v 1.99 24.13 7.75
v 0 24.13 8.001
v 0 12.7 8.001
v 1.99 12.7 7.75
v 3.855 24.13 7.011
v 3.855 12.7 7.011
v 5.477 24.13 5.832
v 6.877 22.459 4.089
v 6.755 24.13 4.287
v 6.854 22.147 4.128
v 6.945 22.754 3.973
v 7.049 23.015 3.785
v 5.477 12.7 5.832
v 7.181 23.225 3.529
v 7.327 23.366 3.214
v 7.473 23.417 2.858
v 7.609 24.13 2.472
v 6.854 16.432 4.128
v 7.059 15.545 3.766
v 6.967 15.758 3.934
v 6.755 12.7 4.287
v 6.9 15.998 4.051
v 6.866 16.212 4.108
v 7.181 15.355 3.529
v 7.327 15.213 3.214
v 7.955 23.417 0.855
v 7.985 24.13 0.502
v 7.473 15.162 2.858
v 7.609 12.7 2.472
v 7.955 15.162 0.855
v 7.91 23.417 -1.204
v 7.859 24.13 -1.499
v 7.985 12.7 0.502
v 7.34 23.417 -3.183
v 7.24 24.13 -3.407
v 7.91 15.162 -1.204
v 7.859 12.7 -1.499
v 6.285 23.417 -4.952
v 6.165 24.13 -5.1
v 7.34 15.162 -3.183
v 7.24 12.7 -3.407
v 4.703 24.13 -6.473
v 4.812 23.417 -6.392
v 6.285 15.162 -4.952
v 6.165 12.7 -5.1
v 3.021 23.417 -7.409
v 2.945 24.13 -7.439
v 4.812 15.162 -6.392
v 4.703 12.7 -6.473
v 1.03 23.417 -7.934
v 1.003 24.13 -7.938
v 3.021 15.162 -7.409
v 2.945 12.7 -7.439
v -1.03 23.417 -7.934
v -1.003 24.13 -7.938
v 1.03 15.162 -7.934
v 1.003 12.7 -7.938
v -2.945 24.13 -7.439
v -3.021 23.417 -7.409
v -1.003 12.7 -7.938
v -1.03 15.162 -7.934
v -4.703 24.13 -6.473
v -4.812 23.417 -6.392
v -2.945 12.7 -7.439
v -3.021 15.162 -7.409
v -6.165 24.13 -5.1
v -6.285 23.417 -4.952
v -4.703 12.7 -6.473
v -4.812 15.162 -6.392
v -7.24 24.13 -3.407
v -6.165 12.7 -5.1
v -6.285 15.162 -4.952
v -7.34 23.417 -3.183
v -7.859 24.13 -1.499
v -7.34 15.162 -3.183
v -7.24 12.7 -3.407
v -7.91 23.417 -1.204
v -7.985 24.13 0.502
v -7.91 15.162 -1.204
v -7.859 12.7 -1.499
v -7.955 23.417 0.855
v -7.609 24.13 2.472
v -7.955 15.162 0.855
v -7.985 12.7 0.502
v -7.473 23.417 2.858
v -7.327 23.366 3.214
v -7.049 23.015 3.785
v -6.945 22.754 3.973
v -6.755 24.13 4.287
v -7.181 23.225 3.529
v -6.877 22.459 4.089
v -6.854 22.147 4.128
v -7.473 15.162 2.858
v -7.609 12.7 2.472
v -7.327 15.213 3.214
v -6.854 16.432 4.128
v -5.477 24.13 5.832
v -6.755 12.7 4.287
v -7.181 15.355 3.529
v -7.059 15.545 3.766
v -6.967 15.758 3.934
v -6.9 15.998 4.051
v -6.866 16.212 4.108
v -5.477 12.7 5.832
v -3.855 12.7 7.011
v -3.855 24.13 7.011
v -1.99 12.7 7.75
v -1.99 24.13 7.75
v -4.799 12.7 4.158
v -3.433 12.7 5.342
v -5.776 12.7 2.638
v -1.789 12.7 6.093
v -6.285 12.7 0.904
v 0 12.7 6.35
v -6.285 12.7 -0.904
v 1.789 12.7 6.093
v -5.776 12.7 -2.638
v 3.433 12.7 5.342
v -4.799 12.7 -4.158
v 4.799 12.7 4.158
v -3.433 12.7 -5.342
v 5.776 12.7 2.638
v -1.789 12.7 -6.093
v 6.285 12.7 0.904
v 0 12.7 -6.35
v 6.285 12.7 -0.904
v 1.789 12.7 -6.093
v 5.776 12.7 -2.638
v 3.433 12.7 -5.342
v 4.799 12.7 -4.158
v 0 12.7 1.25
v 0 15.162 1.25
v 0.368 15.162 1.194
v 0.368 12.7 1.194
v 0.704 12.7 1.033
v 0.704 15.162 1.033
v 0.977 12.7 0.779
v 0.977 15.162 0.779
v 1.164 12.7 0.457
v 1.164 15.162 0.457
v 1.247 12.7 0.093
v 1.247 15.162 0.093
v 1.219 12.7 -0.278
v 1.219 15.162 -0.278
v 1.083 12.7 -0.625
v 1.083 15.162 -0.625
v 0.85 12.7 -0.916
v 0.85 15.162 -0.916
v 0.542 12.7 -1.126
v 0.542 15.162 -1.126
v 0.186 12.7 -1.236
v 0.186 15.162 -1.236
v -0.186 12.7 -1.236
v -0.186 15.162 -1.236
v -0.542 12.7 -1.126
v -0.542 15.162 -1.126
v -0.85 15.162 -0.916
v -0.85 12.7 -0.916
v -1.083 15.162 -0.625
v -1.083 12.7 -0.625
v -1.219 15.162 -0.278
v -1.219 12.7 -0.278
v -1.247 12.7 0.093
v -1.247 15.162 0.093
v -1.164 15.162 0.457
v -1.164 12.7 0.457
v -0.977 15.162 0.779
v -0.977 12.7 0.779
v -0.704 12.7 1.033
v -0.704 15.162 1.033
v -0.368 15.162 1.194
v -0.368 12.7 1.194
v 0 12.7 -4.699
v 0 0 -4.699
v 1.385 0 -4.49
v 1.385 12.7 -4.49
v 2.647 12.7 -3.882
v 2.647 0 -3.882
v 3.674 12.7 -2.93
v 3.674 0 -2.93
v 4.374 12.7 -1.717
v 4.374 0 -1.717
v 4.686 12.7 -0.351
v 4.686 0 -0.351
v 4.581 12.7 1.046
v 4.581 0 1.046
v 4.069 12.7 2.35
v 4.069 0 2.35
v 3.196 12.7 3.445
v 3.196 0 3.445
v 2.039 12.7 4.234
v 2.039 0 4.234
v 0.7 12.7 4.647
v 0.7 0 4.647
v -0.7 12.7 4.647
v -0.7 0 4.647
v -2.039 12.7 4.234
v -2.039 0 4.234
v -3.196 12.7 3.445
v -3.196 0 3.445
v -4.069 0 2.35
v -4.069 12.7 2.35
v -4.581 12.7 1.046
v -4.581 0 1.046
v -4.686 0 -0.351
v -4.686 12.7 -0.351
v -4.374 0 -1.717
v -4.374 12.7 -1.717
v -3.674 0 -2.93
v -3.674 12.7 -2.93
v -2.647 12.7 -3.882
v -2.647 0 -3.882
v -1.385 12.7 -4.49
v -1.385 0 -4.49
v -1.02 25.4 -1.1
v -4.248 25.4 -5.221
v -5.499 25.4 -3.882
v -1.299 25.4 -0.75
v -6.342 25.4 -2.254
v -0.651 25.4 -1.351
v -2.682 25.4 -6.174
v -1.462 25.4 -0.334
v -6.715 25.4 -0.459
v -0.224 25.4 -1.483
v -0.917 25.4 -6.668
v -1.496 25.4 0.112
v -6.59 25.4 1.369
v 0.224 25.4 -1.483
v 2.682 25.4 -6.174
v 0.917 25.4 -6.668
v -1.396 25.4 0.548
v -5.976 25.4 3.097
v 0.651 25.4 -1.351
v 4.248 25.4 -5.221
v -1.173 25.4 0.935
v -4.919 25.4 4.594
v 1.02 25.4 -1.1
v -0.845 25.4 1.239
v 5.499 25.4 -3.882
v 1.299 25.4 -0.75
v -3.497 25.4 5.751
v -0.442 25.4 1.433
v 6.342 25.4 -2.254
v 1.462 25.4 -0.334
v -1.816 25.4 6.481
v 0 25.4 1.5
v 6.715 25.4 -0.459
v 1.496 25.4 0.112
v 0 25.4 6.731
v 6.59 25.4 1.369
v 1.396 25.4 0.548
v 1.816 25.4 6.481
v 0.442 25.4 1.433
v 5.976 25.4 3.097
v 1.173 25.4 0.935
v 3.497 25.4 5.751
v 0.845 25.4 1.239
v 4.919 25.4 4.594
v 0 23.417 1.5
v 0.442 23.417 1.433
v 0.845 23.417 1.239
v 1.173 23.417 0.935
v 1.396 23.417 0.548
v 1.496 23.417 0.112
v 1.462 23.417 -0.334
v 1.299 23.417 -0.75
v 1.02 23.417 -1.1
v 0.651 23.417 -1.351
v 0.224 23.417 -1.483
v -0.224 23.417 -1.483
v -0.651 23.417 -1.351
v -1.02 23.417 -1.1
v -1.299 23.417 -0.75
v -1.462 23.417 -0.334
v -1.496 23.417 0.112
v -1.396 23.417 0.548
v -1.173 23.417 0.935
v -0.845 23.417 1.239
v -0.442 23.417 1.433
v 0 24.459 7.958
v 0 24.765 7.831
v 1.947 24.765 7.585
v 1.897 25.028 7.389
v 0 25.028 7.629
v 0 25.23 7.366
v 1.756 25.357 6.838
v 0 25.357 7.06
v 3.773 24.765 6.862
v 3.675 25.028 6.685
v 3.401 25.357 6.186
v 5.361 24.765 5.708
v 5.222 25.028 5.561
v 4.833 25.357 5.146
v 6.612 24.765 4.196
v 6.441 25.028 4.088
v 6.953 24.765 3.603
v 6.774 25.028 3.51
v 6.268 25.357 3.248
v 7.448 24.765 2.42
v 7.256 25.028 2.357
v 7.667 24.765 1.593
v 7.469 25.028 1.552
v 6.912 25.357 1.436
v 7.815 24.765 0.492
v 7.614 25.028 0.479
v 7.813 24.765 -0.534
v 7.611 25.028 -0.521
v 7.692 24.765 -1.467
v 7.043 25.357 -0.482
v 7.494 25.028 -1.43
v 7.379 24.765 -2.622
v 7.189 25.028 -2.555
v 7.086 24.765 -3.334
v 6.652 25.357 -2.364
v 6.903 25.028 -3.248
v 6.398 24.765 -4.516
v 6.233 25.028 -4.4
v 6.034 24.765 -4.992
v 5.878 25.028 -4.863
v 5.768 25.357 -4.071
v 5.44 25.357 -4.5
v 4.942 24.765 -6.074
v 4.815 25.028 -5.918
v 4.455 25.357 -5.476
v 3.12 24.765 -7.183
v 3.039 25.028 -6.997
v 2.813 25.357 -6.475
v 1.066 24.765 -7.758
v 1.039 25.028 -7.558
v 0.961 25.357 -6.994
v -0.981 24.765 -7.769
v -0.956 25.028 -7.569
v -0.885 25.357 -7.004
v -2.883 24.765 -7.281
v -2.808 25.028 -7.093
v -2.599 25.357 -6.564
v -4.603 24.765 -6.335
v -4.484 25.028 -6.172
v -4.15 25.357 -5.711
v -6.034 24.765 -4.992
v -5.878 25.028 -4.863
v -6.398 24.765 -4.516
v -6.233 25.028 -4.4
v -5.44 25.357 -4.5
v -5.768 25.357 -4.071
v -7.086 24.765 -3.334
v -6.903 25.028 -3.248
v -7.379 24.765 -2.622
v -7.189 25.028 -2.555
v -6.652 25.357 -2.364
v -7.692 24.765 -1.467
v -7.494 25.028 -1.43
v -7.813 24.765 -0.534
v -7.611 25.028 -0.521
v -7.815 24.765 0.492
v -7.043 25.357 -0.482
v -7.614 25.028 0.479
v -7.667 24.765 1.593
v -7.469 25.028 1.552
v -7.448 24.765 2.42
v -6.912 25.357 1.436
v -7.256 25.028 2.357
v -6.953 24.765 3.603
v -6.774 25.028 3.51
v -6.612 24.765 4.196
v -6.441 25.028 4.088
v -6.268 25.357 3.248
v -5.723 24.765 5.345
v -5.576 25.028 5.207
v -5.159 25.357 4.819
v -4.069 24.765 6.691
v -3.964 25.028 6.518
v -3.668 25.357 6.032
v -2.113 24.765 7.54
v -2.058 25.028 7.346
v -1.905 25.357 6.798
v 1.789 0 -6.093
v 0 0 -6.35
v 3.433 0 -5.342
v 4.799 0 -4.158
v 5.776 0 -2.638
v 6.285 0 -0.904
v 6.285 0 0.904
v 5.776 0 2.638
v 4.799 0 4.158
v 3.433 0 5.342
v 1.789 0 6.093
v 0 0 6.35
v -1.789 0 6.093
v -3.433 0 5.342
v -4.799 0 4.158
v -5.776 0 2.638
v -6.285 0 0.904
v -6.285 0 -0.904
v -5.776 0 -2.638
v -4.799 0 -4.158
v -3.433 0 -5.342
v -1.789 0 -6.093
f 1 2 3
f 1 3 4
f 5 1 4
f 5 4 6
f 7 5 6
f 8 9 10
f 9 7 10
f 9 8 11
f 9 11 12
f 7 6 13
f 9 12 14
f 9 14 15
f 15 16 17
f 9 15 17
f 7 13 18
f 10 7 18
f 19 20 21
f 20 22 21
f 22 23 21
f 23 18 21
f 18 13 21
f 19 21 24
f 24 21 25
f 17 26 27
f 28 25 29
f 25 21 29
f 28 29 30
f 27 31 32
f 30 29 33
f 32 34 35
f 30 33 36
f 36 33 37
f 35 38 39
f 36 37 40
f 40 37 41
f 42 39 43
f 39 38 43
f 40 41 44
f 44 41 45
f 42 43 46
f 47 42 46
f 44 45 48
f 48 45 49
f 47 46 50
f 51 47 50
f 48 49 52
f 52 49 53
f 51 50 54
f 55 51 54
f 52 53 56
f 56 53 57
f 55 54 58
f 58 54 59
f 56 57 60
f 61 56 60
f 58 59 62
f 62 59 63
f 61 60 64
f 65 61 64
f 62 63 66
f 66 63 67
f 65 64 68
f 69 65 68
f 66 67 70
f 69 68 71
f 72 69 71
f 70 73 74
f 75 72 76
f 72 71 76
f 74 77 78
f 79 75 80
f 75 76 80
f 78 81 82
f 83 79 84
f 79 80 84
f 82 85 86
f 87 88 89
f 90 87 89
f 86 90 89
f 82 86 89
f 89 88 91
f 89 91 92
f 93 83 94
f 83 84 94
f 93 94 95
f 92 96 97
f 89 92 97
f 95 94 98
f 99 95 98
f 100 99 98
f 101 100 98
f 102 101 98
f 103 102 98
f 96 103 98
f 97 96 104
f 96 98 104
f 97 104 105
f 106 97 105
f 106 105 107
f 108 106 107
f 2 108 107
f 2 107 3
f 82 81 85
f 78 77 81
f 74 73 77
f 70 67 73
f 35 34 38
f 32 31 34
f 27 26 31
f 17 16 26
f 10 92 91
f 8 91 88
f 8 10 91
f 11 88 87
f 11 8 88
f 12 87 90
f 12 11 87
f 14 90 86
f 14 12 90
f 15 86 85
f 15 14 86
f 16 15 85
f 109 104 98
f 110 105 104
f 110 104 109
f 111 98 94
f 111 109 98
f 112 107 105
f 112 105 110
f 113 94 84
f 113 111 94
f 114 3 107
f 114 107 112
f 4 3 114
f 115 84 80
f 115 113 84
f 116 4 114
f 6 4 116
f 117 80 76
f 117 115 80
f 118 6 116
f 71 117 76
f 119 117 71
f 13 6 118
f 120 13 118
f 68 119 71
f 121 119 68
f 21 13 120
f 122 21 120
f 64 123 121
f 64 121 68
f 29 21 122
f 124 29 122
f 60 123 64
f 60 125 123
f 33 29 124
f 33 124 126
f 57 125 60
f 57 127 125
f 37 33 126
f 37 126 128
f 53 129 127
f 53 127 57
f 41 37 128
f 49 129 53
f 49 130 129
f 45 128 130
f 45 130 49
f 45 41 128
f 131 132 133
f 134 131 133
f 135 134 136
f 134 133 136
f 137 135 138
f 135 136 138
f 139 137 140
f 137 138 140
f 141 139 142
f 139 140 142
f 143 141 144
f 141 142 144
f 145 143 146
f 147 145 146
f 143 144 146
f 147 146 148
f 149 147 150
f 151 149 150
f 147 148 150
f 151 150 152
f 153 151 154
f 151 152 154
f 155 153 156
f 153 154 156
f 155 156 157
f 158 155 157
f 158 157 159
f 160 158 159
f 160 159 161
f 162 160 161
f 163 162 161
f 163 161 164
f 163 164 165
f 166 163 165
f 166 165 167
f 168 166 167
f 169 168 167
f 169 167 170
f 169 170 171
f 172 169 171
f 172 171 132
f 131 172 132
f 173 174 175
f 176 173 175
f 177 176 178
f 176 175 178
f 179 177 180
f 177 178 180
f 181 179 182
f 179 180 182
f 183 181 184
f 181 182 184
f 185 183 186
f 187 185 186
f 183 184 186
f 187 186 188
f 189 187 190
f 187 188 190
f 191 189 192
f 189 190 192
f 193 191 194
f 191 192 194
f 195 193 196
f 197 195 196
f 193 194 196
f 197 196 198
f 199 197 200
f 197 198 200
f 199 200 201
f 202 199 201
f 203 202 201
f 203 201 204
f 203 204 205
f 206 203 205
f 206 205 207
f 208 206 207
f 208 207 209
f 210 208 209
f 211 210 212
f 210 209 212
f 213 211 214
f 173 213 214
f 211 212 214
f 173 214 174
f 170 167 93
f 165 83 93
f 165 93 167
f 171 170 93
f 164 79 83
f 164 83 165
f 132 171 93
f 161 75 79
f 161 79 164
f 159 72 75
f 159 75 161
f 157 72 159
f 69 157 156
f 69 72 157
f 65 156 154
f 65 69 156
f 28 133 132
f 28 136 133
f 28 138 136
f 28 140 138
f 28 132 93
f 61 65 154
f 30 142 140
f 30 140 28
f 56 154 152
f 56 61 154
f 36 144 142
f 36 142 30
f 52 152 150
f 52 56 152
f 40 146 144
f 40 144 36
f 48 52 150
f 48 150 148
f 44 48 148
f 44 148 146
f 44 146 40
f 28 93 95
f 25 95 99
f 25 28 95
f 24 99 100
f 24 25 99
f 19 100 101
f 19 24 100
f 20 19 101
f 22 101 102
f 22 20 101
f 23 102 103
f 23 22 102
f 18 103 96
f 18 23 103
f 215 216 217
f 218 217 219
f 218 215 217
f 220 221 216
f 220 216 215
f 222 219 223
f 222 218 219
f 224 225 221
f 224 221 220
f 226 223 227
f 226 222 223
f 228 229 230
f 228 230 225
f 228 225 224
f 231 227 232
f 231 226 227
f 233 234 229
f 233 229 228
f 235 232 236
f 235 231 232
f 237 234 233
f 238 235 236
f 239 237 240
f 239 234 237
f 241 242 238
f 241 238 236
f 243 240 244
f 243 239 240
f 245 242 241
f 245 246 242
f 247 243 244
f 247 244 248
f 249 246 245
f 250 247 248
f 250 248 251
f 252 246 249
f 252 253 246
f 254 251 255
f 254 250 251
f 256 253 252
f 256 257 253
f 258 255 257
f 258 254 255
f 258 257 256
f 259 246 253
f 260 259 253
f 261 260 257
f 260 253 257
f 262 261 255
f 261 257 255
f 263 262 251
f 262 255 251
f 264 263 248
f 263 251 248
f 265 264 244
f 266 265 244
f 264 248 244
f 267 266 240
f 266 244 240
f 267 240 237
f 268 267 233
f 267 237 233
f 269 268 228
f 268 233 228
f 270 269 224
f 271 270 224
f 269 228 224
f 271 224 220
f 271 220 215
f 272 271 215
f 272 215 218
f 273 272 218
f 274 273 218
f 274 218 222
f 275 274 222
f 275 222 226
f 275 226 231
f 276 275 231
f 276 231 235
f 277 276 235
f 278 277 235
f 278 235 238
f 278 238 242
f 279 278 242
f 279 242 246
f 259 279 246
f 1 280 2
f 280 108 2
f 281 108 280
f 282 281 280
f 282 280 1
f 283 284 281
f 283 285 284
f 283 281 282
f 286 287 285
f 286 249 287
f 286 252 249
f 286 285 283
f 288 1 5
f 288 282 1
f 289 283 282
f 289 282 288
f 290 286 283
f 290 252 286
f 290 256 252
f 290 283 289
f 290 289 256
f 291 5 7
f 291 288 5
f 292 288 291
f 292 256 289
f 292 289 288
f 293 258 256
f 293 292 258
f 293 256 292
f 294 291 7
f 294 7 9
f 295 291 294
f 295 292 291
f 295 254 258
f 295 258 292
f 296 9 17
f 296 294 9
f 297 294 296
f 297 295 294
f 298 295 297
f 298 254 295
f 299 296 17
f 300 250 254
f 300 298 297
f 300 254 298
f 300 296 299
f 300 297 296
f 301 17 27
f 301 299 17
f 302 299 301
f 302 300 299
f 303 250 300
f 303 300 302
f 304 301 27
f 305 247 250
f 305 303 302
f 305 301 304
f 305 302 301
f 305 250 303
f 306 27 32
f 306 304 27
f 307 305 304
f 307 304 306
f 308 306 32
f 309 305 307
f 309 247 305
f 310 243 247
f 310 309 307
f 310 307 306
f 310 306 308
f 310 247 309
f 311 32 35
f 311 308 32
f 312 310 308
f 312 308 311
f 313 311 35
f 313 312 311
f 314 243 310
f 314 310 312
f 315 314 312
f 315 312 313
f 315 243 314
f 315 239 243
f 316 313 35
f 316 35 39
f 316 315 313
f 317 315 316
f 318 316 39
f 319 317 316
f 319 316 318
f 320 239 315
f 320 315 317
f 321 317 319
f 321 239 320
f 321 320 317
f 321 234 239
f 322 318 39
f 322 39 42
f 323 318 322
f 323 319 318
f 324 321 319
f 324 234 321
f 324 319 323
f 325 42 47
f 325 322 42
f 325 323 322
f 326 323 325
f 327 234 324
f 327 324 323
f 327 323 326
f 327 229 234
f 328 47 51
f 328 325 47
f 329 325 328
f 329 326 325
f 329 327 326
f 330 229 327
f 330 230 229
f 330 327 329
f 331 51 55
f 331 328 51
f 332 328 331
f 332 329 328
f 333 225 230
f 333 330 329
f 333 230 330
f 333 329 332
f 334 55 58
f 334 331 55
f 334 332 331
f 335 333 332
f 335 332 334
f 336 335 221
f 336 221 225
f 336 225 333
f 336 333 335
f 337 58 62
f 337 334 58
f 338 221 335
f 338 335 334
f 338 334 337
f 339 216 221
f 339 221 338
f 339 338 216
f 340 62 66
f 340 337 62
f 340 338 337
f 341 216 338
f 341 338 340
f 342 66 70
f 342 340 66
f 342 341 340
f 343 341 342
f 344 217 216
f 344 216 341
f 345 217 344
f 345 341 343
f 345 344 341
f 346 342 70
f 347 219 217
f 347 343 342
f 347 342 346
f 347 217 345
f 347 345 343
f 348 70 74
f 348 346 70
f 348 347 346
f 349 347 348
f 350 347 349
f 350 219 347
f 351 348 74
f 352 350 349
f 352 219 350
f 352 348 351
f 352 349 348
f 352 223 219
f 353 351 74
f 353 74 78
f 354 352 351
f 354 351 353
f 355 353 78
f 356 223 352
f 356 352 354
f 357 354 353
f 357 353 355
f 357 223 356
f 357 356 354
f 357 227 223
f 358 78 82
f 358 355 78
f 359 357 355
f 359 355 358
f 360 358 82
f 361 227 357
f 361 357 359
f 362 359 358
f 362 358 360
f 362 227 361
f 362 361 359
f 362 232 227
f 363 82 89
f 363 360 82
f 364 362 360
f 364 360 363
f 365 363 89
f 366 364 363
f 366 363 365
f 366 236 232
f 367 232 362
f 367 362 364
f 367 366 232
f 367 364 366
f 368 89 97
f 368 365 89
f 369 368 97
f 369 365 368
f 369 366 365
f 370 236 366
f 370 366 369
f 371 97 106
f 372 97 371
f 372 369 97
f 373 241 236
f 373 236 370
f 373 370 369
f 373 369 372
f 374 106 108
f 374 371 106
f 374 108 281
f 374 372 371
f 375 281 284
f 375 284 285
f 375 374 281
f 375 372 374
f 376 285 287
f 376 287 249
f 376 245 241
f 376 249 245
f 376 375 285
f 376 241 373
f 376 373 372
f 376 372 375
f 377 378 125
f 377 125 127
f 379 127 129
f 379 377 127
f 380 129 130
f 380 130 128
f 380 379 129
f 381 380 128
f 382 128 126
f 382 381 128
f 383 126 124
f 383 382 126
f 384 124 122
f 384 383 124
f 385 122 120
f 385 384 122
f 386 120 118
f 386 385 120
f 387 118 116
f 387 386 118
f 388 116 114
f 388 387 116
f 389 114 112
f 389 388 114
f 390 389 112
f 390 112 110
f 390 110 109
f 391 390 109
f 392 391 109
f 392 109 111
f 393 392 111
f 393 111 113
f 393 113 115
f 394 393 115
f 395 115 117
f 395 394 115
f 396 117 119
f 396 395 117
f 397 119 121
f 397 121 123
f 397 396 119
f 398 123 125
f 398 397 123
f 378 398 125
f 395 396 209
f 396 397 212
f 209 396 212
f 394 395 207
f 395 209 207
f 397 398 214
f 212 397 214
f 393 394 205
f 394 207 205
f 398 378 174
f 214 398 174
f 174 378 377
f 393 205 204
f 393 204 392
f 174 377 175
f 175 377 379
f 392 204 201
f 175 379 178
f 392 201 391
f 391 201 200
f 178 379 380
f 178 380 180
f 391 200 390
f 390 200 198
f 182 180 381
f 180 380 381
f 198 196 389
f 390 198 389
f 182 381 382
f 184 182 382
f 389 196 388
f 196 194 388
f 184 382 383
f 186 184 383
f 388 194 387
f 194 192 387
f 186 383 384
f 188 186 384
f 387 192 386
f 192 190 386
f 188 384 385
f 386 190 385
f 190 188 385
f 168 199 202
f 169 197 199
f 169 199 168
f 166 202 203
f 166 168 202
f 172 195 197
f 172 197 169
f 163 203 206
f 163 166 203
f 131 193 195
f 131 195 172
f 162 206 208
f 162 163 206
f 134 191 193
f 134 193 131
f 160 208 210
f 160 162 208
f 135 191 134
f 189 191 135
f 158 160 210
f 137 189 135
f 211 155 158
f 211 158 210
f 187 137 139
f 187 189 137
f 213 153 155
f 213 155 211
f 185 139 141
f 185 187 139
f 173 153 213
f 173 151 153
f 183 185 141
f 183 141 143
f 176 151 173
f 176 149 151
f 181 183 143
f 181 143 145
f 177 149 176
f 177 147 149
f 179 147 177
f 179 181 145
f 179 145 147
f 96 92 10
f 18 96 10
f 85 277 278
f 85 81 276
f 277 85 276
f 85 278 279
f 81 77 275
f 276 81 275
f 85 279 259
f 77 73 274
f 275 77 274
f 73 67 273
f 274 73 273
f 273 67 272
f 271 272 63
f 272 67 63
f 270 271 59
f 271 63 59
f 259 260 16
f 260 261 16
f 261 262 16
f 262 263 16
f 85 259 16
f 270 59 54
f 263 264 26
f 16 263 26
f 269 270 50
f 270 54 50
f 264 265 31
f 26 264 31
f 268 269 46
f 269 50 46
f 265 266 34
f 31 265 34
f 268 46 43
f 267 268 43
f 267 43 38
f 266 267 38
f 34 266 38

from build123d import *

# Parameters (mm, degrees)
SKETCH1_R               = 8.001
BOSS_EXTRUDE1_DEPTH     = 25.4
SKETCH2_R               = 8.001
SKETCH2_R_2             = 6.35
SKETCH2_R_3             = 4.699
CUT_EXTRUDE1_DEPTH      = 12.7
CUT_EXTRUDE4_DEPTH      = 4.1275
CUT_EXTRUDE4_DEPTH_BACK = 12.7
SKETCH5_W               = 21.214200292
SKETCH5_H               = 8.255
CUT_EXTRUDE5_REACH      = 29.806
SKETCH6_R               = 1.5
FILLET2_R               = 1.27
FILLET3_R               = 1.27
CUT_EXTRUDE6_REACH      = 20.919
SKETCH7_R               = 1.25


with BuildPart() as part:
    # Sketch1 → Boss-Extrude1 (new body)
    with BuildSketch(Plane(origin=(0, 0, 0), x_dir=(1, 0, 0), z_dir=(0, 1, 0))):
        with Locations(Location((0, 0, 0), (0, 0, 270))):
            Circle(SKETCH1_R)
    extrude(amount=BOSS_EXTRUDE1_DEPTH)

    # Sketch2 → Cut-Extrude1 (cut)
    # profile 1 of 2: a face of its own
    with BuildSketch(Plane(origin=(0, 0, 0), x_dir=(-1, 0, 0), z_dir=(0, -1, 0))):
        with Locations(Location((0, 0, 0), (0, 0, 90))):
            Circle(SKETCH2_R)
        with Locations(Location((0, 0, 0), (0, 0, 90))):
            Circle(SKETCH2_R_2, mode=Mode.SUBTRACT)
    # profile 2 of 2: a face of its own
    with BuildSketch(Plane(origin=(0, 0, 0), x_dir=(-1, 0, 0), z_dir=(0, -1, 0))):
        with Locations(Location((0, 0, 0), (0, 0, 90))):
            Circle(SKETCH2_R_3)
    extrude(amount=-CUT_EXTRUDE1_DEPTH, mode=Mode.SUBTRACT)

    # Sketch5 → Cut-Extrude4 (cut, two sides: drawn at the far end of the back side and taken through both)
    with BuildSketch(Plane.XY.offset(-CUT_EXTRUDE4_DEPTH_BACK)):
        with Locations((0.442410985, 19.289926646)):
            Rectangle(SKETCH5_W, SKETCH5_H)
    extrude(amount=CUT_EXTRUDE4_DEPTH + CUT_EXTRUDE4_DEPTH_BACK, mode=Mode.SUBTRACT)

    # Sketch6 → Cut-Extrude5 (cut, up to next)
    with BuildSketch(Plane(origin=(0, 25.4, 0), x_dir=(1, 0, 0), z_dir=(0, 1, 0)), mode=Mode.PRIVATE) as cut_extrude5_sk1:
        with Locations(Location((0, 0, 0), (0, 0, 270))):
            Circle(SKETCH6_R)
    cut_extrude5_tool1 = extrude(cut_extrude5_sk1.sketch, amount=-CUT_EXTRUDE5_REACH, mode=Mode.PRIVATE) & part.part
    add(cut_extrude5_tool1.solids().sort_by_distance((0, 25.4, 0))[0], mode=Mode.SUBTRACT)

    # Fillet2
    fillet2_edges = [part.edges().sort_by_distance(p)[0] for p in [
        (0, 23.417426646, 4.1275),
        (0, 15.162426646, 4.1275),
    ]]
    fillet(fillet2_edges, radius=FILLET2_R)

    # Fillet3
    fillet3_edges = [part.edges().sort_by_distance(p)[0] for p in [
        (0, 25.4, -8.001),
    ]]
    fillet(fillet3_edges, radius=FILLET3_R)

    # Sketch7 → Cut-Extrude6 (cut, up to next)
    with BuildSketch(Plane(origin=(0, 15.162426646, 0), x_dir=(1, 0, 0), z_dir=(0, 1, 0)), mode=Mode.PRIVATE) as cut_extrude6_sk1:
        with Locations(Location((0, 0, 0), (0, 0, 270))):
            Circle(SKETCH7_R)
    cut_extrude6_tool1 = extrude(cut_extrude6_sk1.sketch, amount=-CUT_EXTRUDE6_REACH, mode=Mode.PRIVATE) & part.part
    add(cut_extrude6_tool1.solids().sort_by_distance((0, 15.162427, 0))[0], mode=Mode.SUBTRACT)


solid = part.part
